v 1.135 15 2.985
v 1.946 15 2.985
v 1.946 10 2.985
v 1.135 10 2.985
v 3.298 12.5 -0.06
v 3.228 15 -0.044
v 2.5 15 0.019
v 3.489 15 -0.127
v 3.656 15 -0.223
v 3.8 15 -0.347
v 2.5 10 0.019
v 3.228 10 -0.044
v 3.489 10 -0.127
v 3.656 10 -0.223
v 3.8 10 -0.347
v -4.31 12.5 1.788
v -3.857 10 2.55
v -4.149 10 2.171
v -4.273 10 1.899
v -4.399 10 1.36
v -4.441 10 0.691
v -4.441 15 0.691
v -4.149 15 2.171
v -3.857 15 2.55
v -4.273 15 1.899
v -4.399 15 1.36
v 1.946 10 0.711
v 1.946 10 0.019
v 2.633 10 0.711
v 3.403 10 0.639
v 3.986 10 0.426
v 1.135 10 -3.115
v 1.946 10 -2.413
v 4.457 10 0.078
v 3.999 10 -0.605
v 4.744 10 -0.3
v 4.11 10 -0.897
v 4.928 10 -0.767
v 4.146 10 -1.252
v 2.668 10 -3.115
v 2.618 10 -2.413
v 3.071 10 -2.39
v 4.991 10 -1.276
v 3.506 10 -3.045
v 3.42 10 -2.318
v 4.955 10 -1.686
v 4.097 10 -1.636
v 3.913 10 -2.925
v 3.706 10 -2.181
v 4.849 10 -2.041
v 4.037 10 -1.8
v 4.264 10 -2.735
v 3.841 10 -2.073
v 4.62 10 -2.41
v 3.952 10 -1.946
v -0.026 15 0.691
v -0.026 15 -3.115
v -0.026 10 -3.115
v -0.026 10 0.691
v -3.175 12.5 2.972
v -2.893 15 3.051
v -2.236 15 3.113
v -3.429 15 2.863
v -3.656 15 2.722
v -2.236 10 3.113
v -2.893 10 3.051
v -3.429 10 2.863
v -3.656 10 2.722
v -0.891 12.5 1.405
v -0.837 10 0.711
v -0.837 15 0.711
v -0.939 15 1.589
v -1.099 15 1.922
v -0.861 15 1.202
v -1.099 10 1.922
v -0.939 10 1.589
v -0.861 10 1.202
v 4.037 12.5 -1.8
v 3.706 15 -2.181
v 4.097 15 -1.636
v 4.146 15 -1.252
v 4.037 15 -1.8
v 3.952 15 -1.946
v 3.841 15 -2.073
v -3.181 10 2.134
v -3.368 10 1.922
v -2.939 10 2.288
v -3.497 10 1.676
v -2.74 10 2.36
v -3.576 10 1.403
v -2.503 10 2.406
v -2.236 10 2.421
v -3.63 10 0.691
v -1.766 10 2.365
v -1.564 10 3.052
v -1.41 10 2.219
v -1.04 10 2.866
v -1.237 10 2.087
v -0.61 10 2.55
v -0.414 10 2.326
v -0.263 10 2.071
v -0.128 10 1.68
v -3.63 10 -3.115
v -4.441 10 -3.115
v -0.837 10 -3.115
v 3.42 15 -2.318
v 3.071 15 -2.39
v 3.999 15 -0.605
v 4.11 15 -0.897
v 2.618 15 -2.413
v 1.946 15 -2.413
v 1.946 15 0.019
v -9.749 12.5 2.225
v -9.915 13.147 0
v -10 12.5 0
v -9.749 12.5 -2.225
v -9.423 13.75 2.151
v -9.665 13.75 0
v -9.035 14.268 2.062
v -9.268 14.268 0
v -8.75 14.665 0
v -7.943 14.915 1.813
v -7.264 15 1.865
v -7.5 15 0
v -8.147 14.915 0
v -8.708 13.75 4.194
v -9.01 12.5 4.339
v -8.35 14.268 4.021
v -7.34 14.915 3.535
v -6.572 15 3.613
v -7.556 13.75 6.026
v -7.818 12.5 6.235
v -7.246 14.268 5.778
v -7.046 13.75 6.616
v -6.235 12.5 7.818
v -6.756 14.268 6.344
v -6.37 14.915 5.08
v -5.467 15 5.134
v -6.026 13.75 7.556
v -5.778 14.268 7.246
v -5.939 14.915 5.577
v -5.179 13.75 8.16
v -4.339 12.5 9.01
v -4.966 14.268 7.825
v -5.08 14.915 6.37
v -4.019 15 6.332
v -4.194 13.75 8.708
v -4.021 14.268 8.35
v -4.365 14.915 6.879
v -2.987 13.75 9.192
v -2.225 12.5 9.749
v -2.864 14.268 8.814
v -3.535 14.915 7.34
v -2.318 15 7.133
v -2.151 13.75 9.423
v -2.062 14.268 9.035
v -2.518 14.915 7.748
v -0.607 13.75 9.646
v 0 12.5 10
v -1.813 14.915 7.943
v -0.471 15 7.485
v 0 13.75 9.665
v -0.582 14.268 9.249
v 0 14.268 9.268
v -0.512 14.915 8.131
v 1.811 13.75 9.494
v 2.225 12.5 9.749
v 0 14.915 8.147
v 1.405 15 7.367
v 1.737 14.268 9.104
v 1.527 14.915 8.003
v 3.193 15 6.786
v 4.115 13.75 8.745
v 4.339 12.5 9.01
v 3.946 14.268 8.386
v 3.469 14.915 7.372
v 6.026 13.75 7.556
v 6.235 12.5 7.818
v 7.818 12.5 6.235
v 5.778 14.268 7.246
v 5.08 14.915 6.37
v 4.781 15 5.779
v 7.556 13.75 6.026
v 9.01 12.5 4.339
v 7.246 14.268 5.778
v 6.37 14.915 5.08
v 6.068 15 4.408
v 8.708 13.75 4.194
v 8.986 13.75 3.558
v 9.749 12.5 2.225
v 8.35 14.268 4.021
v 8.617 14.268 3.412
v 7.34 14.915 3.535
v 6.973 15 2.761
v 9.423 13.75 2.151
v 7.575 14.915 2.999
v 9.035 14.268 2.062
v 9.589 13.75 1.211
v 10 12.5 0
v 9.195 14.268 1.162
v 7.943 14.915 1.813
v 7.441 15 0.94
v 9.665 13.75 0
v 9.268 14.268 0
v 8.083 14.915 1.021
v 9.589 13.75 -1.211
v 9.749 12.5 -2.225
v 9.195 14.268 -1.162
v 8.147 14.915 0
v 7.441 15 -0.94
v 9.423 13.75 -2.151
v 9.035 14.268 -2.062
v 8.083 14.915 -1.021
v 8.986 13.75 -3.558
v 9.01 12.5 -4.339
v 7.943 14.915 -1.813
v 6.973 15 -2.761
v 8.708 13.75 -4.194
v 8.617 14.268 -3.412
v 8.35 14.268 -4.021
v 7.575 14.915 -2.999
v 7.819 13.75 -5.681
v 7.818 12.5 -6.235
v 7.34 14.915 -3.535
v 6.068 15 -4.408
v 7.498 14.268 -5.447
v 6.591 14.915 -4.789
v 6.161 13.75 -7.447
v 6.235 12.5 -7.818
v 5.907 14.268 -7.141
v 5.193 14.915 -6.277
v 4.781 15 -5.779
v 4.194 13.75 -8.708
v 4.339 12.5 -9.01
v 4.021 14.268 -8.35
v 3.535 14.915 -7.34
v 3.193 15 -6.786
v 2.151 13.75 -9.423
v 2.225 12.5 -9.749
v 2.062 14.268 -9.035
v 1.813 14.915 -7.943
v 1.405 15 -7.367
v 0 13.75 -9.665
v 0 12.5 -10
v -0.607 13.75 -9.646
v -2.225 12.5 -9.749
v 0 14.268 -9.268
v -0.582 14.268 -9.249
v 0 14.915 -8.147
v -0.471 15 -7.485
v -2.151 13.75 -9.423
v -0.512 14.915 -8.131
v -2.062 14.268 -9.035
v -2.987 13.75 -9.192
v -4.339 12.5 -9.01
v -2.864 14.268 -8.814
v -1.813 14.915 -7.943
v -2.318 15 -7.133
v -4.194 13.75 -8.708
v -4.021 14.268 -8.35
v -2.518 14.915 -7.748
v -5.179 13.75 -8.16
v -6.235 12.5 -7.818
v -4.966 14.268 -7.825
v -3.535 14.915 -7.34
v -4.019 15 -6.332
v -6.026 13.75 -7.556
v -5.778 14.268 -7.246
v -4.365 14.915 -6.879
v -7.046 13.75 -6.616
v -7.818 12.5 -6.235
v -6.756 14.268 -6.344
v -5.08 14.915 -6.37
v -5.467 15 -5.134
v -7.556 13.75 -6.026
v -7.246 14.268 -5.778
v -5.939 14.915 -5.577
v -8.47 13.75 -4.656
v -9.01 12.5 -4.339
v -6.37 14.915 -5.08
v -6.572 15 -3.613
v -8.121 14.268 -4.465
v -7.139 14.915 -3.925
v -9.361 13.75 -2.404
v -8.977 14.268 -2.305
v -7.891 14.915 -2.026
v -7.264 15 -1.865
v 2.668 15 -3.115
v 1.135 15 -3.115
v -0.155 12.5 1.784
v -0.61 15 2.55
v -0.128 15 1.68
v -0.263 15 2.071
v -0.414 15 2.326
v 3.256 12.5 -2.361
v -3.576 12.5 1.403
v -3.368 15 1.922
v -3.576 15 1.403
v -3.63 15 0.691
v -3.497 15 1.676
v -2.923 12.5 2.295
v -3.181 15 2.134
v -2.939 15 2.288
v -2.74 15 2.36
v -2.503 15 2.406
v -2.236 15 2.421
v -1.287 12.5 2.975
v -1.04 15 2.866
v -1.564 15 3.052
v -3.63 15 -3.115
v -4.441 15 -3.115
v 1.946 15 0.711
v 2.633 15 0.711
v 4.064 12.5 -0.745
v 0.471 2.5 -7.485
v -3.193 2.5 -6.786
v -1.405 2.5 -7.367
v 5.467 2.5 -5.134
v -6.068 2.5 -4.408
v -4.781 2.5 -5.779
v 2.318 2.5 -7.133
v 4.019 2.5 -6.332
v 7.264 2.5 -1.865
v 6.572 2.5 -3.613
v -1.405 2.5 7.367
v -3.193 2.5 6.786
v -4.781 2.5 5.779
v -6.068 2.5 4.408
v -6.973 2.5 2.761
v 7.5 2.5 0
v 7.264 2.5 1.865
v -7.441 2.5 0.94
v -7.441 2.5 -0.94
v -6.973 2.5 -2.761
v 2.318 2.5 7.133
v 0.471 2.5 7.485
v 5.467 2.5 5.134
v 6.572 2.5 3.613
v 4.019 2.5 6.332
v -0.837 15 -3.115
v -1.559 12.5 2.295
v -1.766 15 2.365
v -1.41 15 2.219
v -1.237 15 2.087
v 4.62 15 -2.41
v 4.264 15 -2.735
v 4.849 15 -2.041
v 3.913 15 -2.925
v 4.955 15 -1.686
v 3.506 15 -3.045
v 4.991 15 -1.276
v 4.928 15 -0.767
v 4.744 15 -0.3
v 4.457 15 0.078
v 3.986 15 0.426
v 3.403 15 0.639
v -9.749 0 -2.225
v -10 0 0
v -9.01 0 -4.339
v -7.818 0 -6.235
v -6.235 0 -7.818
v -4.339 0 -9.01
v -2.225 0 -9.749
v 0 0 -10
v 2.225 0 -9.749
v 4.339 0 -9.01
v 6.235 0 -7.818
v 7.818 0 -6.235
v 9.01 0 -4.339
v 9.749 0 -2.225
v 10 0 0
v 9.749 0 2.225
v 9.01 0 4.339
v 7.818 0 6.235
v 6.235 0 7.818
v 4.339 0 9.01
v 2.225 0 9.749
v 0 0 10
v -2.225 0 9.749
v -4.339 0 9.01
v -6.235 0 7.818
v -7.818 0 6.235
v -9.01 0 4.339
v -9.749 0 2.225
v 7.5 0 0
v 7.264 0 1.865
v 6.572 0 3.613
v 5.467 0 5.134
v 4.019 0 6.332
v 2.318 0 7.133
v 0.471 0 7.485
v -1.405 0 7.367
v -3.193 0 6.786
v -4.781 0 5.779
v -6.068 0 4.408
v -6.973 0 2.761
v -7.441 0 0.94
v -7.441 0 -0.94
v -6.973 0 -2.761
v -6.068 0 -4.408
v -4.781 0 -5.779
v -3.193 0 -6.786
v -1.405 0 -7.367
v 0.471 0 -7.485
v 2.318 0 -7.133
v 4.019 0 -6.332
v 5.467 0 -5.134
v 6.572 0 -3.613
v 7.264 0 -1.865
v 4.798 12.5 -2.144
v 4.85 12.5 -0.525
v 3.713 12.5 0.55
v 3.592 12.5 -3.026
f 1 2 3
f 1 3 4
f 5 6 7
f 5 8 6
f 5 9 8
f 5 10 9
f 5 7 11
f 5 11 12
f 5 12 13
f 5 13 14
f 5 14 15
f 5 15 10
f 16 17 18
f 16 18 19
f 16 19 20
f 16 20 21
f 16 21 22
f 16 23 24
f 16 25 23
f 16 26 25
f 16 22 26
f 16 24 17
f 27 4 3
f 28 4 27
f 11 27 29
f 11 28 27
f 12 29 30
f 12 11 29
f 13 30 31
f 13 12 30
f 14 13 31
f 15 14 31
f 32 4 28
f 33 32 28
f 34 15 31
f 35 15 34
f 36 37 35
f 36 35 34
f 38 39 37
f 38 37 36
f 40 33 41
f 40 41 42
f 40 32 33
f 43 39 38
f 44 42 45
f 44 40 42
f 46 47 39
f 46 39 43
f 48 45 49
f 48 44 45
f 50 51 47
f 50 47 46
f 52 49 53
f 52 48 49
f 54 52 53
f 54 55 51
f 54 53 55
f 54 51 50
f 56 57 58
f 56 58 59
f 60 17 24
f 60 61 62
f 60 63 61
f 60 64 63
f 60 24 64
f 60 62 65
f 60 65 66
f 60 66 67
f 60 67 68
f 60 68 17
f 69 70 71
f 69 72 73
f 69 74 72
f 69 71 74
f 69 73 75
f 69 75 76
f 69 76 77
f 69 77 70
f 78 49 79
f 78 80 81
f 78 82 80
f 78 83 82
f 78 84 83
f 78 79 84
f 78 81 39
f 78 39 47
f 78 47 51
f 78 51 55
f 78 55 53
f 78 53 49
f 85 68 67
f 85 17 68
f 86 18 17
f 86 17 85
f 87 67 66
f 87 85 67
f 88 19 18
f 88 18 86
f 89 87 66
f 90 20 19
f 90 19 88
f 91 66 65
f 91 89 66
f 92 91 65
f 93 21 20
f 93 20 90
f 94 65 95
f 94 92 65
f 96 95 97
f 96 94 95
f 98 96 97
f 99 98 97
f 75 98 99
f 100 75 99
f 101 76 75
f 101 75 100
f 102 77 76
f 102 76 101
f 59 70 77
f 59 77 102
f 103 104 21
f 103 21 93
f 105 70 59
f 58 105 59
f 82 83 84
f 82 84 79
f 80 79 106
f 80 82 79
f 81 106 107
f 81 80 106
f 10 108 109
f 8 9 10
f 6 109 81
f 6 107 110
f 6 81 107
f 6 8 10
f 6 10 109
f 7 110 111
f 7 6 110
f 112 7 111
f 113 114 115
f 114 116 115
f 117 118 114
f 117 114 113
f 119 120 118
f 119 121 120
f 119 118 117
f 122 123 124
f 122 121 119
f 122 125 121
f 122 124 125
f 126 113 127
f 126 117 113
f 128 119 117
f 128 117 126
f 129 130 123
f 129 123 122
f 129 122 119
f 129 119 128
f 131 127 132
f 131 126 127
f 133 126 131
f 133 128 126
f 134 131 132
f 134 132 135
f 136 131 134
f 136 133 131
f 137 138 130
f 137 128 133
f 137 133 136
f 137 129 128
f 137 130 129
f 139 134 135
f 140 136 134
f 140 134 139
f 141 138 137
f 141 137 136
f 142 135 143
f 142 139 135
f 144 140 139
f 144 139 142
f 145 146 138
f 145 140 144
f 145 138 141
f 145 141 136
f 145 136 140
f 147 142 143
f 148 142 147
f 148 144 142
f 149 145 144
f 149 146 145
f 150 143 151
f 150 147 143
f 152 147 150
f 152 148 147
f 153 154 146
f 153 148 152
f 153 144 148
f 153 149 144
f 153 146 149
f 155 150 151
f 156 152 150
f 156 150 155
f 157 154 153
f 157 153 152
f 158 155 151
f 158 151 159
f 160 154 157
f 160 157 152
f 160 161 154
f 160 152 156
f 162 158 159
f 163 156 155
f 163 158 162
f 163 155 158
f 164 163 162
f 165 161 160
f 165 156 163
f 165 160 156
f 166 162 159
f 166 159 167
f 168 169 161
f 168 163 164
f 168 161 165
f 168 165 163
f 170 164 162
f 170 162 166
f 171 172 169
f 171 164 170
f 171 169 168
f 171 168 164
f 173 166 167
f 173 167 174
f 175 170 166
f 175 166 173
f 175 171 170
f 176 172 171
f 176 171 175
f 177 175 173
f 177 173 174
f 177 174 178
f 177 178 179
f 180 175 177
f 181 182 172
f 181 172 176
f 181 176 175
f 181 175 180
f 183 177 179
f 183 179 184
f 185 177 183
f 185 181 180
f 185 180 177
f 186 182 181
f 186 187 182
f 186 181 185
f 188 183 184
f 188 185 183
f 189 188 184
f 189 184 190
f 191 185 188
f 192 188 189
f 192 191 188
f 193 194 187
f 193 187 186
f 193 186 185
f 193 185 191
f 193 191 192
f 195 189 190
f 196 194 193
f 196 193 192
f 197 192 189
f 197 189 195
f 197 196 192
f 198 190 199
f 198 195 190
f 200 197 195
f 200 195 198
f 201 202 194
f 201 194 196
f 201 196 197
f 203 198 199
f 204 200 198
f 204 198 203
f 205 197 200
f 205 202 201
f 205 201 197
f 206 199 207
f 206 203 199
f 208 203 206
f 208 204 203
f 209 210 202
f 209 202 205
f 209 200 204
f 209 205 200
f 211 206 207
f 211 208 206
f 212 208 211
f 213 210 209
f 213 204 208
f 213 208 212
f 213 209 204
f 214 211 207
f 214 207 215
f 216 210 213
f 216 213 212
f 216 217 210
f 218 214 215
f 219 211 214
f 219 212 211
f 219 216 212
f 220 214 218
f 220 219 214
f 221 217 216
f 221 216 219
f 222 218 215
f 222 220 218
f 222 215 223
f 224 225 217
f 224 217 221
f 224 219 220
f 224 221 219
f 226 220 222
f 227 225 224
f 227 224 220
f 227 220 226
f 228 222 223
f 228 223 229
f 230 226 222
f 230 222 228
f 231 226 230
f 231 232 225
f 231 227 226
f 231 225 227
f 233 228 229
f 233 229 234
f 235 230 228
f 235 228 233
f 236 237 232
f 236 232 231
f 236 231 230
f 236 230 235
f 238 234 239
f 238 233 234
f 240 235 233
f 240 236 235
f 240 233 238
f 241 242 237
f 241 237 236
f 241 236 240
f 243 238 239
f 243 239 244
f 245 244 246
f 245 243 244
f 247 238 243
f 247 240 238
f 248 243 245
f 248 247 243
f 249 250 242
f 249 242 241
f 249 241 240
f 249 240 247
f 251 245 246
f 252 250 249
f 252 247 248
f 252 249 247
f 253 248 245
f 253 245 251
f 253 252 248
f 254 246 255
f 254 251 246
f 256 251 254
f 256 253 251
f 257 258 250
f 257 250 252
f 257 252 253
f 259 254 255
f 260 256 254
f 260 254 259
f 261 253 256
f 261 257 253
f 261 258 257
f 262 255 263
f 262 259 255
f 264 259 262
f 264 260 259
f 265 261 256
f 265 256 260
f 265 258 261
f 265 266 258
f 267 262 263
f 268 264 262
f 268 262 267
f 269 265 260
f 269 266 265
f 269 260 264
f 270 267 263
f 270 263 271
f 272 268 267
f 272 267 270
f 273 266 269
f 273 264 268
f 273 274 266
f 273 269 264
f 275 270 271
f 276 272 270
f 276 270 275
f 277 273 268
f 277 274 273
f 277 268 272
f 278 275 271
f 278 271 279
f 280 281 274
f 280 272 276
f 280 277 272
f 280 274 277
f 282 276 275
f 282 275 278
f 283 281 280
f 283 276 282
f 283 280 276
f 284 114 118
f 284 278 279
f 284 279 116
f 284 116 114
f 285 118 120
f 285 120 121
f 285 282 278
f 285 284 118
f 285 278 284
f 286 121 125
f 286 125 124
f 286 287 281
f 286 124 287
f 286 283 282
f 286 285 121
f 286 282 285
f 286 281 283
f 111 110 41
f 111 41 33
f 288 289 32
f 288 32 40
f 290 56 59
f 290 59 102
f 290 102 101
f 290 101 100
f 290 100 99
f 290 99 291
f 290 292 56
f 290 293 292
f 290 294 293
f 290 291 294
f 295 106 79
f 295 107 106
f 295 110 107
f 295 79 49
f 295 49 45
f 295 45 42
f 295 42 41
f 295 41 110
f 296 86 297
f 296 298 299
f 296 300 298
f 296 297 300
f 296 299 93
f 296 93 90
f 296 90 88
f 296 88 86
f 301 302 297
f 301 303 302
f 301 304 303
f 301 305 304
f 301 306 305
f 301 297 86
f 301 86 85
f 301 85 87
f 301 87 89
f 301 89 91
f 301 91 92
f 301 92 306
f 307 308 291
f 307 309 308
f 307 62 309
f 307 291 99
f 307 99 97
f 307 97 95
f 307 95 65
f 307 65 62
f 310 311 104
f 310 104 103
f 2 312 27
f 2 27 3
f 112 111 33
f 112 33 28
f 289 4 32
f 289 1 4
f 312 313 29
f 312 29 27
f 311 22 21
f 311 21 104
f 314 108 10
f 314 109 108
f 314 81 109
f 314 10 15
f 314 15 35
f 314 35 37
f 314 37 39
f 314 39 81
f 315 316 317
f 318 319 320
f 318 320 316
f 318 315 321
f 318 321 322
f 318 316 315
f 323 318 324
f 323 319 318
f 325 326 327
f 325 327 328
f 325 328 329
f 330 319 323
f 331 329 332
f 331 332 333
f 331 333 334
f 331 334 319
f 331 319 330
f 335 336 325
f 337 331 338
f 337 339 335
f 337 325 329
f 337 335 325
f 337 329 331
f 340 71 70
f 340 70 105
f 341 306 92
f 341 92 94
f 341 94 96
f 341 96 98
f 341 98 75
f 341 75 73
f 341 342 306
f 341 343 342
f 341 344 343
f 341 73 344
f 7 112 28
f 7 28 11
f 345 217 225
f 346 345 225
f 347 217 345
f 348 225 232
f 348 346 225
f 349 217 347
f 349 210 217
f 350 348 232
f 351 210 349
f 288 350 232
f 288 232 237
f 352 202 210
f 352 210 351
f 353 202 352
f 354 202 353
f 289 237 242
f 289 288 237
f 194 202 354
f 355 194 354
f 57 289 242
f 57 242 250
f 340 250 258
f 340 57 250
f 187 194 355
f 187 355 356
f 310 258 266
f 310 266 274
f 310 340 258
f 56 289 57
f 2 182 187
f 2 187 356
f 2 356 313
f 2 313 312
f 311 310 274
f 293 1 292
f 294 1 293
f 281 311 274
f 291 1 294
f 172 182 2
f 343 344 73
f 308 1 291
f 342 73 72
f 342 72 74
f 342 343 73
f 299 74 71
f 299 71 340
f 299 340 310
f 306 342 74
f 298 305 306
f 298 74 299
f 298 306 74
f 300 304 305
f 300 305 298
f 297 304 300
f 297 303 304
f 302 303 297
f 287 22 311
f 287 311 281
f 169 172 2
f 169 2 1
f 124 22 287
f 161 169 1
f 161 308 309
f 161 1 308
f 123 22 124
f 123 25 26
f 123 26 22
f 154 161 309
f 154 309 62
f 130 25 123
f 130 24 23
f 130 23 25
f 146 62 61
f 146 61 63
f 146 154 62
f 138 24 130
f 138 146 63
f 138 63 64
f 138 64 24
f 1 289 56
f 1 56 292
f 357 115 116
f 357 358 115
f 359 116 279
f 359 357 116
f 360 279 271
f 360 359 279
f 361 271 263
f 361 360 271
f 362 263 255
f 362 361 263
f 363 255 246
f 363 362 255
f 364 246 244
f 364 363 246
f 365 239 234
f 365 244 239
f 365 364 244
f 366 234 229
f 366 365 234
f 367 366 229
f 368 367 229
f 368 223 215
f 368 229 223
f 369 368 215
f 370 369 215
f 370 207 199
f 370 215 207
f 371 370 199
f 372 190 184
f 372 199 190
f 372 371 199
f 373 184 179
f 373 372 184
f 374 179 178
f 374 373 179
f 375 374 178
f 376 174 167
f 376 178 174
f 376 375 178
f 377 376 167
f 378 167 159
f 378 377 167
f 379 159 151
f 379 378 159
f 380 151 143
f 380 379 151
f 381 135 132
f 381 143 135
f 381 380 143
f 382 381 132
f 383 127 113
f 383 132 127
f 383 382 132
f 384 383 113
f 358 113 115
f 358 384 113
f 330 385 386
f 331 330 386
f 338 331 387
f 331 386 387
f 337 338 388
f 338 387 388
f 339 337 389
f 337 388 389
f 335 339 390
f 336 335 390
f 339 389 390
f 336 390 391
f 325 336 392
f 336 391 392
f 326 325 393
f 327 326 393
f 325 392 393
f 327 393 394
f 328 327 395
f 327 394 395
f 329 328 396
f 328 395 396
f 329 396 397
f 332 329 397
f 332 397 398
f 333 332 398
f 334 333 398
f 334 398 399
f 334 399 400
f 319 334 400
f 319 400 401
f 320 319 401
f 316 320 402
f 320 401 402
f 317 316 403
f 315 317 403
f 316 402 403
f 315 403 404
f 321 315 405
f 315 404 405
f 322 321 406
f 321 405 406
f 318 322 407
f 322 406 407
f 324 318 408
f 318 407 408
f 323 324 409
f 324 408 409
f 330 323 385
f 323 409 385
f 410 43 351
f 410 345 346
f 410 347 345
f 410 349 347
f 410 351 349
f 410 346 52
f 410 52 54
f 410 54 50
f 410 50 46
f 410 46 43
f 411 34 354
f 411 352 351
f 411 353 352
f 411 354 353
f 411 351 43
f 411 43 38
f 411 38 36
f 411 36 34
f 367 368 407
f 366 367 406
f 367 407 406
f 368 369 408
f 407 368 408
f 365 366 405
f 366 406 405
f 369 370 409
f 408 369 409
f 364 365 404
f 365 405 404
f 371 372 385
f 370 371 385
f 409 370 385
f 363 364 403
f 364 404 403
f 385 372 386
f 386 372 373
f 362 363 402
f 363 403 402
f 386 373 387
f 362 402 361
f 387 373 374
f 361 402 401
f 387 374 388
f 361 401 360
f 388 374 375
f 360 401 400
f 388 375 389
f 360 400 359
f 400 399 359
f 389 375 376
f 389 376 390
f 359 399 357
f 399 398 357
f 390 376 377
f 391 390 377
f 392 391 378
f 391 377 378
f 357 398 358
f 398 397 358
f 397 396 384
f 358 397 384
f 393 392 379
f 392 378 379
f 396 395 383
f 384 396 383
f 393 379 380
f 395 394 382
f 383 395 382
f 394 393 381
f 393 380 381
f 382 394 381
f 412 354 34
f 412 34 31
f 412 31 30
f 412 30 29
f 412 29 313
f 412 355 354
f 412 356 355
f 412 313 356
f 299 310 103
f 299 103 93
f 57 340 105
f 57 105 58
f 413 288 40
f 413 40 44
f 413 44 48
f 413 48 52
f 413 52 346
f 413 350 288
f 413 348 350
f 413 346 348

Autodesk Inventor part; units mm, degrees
ref_plane "YZ Plane" through (0, 0, 0) normal (1, 0, 0) x (0, 1, 0)
ref_plane "XZ Plane" through (0, 0, 0) normal (0, 1, 0) x (-1, 0, 0)
ref_plane "XY Plane" through (0, 0, 0) normal (0, 0, 1) x (1, 0, 0)
sketch "Sketch1" plane through (0, 0, 0) normal (0, 1, 0) x (-1, 0, 0)
  circle A0 centre (0, 0) radius 10
  dimension "d0" = 20
extrude "Extrusion1" add sketch "Sketch1" along normal blind 15
fillet "Fillet1" radius 2.5 1 edges at (10, 15, 0)
sketch "Sketch2" plane through (0, 15, 0) normal (0, 1, 0) x (1, 0, 0)
  line L0 (-4.9845, 3.1153) -> (3.7384, 3.1153) construction
  line L1 (3.7384, 3.1153) -> (3.7384, -3.4029) construction
  line L2 (3.7384, -3.4029) -> (-4.9845, -3.4029) construction
  line L3 (-4.9845, -3.4029) -> (-4.9845, 3.1153) construction
  spline S0 degree 2 poles (-2.236, -3.1132) (-2.7748, -3.1132) (-3.5756, -2.8315) (-3.8574, -2.5497) knots 0 0 0 1 2 2 2
  spline S1 degree 2 poles (-3.8574, -2.5497) (-4.1787, -2.2333) (-4.4407, -1.3435) (-4.4407, -0.691) knots 0 0 0 1 2 2 2
  line L4 (-4.4407, -0.691) -> (-4.4407, 3.1153)
  line L5 (-4.4407, 3.1153) -> (-3.63, 3.1153)
  line L6 (-3.63, 3.1153) -> (-3.63, -0.691)
  spline S2 degree 2 poles (-3.63, -0.691) (-3.63, -1.1162) (-3.5213, -1.6896) (-3.368, -1.9219) knots 0 0 0 1 2 2 2
  spline S3 degree 2 poles (-3.368, -1.9219) (-3.2049, -2.1691) (-2.6414, -2.4212) (-2.236, -2.4212) knots 0 0 0 1 2 2 2
  spline S4 degree 2 poles (-2.236, -2.4212) (-1.8554, -2.4212) (-1.2622, -2.1691) (-1.0991, -1.9219) knots 0 0 0 1 2 2 2
  spline S5 degree 2 poles (-1.0991, -1.9219) (-0.9458, -1.6896) (-0.8371, -1.1211) (-0.8371, -0.7108) knots 0 0 0 1 2 2 2
  line L7 (-0.8371, -0.7108) -> (-0.8371, 3.1153)
  line L8 (-0.8371, 3.1153) -> (-0.0264, 3.1153)
  line L9 (-0.0264, 3.1153) -> (-0.0264, -0.691)
  spline S6 degree 2 poles (-0.0264, -0.691) (-0.0264, -1.3287) (-0.2834, -2.2383) (-0.6097, -2.5497) knots 0 0 0 1 2 2 2
  spline S7 degree 2 poles (-0.6097, -2.5497) (-0.9013, -2.8364) (-1.6725, -3.1132) (-2.236, -3.1132) knots 0 0 0 1 2 2 2
  spline S8 degree 2 poles (4.9911, 1.2764) (4.9911, 0.8809) (4.7093, 0.1691) (4.4572, -0.0781) knots 0 0 0 1 2 2 2
  spline S9 degree 2 poles (4.4572, -0.0781) (4.1408, -0.3895) (3.2856, -0.7108) (2.6331, -0.7108) knots 0 0 0 1 2 2 2
  line L10 (2.6331, -0.7108) -> (1.946, -0.7108)
  line L11 (1.946, -0.7108) -> (1.946, -2.9847)
  line L12 (1.946, -2.9847) -> (1.1353, -2.9847)
  line L13 (1.1353, -2.9847) -> (1.1353, 3.1153)
  line L14 (1.1353, 3.1153) -> (2.6677, 3.1153)
  spline S10 degree 2 poles (2.6677, 3.1153) (3.2115, 3.1153) (3.9727, 2.9373) (4.2644, 2.7347) knots 0 0 0 1 2 2 2
  spline S11 degree 2 poles (4.2644, 2.7347) (4.6055, 2.5023) (4.9911, 1.7856) (4.9911, 1.2764) knots 0 0 0 1 2 2 2
  spline S12 degree 2 poles (4.1458, 1.2517) (4.1458, 1.568) (3.9283, 2.0327) (3.7058, 2.181) knots 0 0 0 1 2 2 2
  spline S13 degree 2 poles (3.7058, 2.181) (3.513, 2.3095) (2.9989, 2.4133) (2.6183, 2.4133) knots 0 0 0 1 2 2 2
  line L15 (2.6183, 2.4133) -> (1.946, 2.4133)
  line L16 (1.946, 2.4133) -> (1.946, -0.0187)
  line L17 (1.946, -0.0187) -> (2.4996, -0.0187)
  spline S14 degree 2 poles (2.4996, -0.0187) (2.994, -0.0187) (3.602, 0.1394) (3.7997, 0.3471) knots 0 0 0 1 2 2 2
  spline S15 degree 2 poles (3.7997, 0.3471) (3.9826, 0.53) (4.1458, 0.96) (4.1458, 1.2517) knots 0 0 0 1 2 2 2
  point P0 (0, 0)
extrude "Extrusion2" cut sketch "Sketch2" against normal blind 5
sketch "Sketch3" plane through (0, 0, 0) normal (0, -1, 0) x (1, 0, 0)
  circle A0 centre (0, 0) radius 7.5
extrude "Extrusion3" cut sketch "Sketch3" against normal blind 2.5
properties part number "UP Button"
